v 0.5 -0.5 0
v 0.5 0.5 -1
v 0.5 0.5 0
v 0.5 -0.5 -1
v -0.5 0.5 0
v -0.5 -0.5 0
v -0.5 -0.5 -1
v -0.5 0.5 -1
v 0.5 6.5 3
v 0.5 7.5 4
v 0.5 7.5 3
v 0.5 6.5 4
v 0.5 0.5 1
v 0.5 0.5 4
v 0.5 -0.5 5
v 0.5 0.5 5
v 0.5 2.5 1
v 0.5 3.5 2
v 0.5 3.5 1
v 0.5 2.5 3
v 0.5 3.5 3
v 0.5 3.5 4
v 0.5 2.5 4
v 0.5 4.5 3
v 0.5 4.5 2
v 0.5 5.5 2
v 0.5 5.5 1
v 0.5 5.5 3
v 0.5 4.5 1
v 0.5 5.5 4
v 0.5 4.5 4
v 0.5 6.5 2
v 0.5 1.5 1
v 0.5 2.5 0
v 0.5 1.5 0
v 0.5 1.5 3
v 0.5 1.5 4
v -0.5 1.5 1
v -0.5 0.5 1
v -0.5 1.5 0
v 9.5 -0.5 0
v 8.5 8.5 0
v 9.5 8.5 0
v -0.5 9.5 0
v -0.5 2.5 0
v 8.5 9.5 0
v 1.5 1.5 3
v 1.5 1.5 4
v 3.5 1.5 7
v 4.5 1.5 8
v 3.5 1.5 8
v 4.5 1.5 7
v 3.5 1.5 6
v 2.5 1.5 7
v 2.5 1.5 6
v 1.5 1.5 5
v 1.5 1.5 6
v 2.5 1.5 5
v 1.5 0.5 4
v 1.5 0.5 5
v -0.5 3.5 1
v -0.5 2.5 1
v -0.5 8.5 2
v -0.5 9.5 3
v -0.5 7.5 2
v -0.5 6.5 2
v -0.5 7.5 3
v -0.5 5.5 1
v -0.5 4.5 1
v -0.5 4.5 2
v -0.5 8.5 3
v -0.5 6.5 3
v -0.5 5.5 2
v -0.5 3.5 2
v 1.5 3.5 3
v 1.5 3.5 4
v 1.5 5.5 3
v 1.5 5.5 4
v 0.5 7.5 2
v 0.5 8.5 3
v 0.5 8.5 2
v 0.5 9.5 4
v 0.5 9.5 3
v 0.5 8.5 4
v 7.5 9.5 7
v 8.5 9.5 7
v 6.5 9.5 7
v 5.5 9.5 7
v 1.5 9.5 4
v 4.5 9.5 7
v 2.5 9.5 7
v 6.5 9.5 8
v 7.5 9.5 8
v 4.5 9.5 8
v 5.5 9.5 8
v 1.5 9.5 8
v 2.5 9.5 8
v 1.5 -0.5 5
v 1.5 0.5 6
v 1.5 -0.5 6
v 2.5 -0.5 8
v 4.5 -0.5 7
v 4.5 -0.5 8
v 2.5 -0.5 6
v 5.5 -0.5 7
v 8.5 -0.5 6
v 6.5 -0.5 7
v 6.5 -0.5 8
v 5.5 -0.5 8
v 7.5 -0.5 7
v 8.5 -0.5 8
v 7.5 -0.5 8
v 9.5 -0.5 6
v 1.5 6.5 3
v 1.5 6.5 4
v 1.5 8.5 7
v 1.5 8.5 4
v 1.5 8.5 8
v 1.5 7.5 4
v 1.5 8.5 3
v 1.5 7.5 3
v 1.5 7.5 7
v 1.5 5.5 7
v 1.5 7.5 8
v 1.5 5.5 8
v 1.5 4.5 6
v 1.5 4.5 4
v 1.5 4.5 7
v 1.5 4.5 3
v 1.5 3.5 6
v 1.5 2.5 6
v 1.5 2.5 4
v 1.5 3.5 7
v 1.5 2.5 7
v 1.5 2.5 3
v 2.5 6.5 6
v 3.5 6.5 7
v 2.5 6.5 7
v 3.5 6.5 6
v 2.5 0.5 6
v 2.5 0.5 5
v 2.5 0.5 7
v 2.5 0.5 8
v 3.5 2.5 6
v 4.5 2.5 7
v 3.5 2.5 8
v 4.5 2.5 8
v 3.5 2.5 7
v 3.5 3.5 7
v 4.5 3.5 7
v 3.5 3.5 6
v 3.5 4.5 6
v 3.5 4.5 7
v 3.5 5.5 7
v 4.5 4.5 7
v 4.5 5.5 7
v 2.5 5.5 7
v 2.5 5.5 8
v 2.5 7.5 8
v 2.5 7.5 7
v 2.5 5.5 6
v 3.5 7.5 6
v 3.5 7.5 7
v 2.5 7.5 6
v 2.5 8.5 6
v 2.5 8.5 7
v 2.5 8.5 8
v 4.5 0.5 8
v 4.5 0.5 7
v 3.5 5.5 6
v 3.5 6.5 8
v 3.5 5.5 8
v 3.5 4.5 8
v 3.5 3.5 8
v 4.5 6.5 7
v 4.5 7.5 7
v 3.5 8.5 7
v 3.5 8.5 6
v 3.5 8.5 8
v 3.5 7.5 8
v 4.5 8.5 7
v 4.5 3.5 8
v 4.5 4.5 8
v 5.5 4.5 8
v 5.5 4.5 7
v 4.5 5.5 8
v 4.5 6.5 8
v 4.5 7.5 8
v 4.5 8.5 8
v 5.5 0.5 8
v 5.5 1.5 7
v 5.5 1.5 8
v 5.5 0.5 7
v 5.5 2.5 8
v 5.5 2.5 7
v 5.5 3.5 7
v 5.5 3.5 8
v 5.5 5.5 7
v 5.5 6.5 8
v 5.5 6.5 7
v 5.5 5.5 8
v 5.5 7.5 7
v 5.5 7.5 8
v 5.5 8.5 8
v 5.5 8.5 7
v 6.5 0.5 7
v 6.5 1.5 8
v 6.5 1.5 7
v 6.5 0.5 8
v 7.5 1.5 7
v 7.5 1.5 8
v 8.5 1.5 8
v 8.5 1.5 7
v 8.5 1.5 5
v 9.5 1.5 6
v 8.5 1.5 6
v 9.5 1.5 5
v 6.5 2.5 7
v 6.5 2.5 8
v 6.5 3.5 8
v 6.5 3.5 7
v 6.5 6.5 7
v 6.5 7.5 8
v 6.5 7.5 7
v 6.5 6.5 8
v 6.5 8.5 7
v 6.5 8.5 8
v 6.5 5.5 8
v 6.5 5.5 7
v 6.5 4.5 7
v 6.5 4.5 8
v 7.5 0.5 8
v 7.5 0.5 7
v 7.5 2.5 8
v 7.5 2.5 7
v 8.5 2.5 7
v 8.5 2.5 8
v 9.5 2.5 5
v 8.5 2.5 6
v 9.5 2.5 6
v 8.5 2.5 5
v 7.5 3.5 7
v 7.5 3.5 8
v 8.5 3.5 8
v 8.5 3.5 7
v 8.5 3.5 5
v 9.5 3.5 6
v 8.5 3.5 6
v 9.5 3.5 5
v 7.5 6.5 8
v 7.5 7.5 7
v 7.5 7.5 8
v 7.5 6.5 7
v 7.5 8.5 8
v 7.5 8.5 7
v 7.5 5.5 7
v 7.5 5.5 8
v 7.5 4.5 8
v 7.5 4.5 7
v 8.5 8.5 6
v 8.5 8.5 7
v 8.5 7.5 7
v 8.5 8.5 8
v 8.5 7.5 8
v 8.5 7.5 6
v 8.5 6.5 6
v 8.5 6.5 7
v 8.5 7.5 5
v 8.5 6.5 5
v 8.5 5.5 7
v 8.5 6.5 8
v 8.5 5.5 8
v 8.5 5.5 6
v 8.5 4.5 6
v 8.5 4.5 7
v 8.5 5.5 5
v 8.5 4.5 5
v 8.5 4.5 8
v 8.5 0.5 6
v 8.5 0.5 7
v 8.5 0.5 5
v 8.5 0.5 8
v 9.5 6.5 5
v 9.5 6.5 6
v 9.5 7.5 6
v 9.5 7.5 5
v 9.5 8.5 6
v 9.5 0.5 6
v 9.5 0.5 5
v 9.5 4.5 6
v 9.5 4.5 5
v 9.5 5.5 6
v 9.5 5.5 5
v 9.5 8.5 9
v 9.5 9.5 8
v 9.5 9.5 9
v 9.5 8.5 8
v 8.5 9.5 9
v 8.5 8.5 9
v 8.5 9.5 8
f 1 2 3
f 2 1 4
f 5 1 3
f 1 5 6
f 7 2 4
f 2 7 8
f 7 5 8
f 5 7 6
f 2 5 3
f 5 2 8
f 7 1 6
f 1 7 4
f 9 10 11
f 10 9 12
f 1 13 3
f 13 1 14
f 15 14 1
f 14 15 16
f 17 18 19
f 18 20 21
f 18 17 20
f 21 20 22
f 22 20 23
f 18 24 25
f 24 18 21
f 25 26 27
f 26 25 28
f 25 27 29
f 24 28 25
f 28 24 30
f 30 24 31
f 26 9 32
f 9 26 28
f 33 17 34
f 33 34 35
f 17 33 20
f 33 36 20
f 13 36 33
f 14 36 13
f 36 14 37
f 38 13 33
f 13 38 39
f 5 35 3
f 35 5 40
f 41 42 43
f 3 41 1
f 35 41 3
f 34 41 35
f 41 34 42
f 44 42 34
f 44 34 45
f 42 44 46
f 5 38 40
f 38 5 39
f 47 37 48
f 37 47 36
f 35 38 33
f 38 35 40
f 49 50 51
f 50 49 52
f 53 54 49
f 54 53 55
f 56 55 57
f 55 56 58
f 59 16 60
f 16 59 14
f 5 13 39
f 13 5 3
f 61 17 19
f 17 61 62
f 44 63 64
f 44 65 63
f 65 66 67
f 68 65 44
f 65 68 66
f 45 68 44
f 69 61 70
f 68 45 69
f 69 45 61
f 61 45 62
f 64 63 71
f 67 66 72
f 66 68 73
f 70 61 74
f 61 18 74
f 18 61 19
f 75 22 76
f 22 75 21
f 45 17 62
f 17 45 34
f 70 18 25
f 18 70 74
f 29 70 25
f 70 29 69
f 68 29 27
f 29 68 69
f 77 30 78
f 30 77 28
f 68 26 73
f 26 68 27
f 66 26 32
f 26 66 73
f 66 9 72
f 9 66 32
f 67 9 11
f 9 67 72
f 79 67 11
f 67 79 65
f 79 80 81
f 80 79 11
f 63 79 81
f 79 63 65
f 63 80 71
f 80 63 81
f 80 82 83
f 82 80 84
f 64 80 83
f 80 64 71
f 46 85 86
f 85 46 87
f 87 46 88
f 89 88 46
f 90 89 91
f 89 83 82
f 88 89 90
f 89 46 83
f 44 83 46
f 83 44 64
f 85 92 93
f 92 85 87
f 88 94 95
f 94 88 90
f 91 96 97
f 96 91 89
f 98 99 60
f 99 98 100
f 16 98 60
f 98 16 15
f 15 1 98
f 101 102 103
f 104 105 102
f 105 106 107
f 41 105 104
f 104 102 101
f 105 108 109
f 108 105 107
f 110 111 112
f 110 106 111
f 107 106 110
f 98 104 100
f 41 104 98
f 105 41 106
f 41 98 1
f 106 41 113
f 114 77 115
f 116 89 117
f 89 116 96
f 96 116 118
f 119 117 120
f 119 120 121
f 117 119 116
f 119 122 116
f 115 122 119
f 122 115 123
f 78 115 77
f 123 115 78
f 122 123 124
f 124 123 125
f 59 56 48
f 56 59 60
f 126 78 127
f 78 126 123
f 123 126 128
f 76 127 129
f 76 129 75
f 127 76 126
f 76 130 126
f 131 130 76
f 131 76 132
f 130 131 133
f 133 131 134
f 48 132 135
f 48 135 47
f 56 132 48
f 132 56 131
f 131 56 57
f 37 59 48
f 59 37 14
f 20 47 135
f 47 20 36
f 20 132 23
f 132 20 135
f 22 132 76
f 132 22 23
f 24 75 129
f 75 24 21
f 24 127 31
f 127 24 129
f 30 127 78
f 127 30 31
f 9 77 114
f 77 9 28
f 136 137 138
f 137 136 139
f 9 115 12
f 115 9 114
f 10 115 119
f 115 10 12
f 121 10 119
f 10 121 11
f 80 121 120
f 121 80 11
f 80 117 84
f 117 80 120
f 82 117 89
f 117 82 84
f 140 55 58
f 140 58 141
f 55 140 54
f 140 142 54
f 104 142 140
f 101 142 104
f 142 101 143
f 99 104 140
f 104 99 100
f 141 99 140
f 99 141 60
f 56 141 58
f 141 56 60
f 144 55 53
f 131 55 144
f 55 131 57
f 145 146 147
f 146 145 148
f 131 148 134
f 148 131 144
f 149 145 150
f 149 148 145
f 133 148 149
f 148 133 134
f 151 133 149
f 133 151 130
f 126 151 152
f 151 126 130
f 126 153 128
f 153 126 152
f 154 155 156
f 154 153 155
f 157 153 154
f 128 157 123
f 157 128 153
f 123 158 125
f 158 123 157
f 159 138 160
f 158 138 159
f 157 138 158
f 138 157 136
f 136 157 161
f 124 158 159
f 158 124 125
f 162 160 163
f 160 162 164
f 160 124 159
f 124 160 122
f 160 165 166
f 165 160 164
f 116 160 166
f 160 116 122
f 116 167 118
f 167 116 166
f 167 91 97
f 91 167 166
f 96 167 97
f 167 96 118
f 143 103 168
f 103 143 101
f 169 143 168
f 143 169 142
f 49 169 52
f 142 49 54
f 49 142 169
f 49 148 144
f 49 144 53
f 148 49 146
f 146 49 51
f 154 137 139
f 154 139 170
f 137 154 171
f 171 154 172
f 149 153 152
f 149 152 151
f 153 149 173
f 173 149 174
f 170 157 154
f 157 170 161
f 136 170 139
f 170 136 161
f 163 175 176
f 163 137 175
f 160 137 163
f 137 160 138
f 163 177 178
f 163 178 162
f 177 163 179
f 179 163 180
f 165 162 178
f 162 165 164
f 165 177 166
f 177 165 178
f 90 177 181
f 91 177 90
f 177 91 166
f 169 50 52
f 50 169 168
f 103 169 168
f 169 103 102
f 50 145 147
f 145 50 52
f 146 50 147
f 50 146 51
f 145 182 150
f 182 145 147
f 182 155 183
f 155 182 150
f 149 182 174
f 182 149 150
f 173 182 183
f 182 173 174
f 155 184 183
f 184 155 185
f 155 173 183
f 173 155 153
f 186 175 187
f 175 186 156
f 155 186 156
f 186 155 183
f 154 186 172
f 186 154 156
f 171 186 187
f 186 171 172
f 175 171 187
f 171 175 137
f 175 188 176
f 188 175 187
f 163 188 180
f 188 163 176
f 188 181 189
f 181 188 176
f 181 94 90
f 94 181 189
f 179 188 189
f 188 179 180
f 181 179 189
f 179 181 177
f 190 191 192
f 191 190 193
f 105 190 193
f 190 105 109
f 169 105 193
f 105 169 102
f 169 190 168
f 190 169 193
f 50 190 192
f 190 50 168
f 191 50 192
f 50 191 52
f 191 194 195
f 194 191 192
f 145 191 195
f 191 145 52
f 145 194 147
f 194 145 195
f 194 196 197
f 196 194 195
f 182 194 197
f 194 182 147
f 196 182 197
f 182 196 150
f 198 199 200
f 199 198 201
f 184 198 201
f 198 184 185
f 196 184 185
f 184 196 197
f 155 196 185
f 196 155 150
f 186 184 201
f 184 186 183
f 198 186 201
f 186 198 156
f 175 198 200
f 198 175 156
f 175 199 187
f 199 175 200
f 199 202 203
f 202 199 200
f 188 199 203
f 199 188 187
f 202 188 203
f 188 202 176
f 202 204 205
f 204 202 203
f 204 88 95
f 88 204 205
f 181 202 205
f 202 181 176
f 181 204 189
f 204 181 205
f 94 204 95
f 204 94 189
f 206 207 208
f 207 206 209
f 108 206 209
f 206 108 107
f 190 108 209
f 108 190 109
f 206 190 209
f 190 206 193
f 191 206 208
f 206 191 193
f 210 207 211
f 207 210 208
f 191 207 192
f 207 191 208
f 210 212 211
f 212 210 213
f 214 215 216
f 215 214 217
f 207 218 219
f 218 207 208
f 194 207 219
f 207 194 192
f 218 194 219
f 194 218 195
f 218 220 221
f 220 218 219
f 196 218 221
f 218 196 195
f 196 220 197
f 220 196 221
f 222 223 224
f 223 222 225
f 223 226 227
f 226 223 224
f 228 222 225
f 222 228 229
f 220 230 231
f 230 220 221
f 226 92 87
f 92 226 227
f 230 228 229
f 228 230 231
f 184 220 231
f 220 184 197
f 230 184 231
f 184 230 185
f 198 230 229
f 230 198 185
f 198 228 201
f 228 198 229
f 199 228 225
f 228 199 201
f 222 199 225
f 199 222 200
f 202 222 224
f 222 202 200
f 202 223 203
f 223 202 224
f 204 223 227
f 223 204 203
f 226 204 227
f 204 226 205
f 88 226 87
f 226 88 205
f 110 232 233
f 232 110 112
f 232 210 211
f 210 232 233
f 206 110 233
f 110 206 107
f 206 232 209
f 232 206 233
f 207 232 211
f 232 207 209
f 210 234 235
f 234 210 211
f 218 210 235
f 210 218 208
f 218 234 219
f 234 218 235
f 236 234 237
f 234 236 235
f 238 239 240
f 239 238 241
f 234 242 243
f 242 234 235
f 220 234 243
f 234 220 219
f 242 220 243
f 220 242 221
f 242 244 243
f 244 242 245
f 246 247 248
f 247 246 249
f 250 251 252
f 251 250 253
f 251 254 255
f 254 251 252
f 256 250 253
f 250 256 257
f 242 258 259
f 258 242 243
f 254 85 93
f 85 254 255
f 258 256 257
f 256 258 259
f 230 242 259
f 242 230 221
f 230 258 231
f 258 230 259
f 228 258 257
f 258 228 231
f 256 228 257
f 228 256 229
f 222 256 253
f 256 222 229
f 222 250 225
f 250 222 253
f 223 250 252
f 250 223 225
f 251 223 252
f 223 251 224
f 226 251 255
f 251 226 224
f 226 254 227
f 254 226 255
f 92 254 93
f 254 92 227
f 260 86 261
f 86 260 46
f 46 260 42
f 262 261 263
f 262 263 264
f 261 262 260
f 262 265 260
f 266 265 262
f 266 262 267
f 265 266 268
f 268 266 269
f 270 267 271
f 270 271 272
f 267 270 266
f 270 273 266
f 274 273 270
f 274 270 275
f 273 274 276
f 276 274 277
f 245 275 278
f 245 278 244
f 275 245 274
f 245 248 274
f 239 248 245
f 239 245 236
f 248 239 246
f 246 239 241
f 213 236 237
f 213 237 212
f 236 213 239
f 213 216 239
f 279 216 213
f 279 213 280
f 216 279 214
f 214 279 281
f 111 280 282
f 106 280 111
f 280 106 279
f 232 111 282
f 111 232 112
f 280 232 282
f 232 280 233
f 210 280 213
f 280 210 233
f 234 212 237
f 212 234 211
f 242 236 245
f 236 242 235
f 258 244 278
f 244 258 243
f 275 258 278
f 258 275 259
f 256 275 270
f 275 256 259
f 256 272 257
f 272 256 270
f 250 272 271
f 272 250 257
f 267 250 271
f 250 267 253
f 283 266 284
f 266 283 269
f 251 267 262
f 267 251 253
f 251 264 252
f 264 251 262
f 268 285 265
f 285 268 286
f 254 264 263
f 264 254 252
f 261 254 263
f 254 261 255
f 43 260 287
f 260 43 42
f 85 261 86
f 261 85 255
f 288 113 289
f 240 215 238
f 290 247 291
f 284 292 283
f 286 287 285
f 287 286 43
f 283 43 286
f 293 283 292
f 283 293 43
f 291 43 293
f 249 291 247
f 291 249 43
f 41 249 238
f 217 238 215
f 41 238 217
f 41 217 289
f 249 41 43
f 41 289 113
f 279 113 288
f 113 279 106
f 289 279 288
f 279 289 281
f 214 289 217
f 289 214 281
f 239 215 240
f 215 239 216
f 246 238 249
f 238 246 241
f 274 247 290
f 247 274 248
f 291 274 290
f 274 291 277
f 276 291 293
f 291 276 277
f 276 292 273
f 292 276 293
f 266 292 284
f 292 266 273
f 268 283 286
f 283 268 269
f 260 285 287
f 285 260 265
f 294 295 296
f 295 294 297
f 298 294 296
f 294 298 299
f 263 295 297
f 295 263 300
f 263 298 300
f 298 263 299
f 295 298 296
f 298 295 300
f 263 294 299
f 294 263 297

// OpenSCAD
union() {
    translate([0, 0, -0.5]) color([1, 0, 0]) cube([1, 1, 1], center=true);
    translate([0, 1, 0.5]) cube([1, 1, 1], center=true);
    translate([0, 3, 0.5]) cube([1, 1, 1], center=true);
    translate([0, 4, 1.0]) cube([1, 1, 2], center=true);
    translate([0, 5, 0.5]) cube([1, 1, 1], center=true);
    translate([0, 6, 1.0]) cube([1, 1, 2], center=true);
    translate([0, 7, 1.5]) cube([1, 1, 3], center=true);
    translate([0, 8, 1.0]) cube([1, 1, 2], center=true);
    translate([0, 9, 1.5]) cube([1, 1, 3], center=true);
    translate([1, 0, 2.5]) cube([1, 1, 5], center=true);
    translate([1, 1, 2.0]) cube([1, 1, 4], center=true);
    translate([1, 2, 1.5]) cube([1, 1, 3], center=true);
    translate([1, 3, 2.0]) cube([1, 1, 4], center=true);
    translate([1, 4, 1.5]) cube([1, 1, 3], center=true);
    translate([1, 5, 2.0]) cube([1, 1, 4], center=true);
    translate([1, 6, 1.5]) cube([1, 1, 3], center=true);
    translate([1, 7, 2.0]) cube([1, 1, 4], center=true);
    translate([1, 8, 1.5]) cube([1, 1, 3], center=true);
    translate([1, 9, 2.0]) cube([1, 1, 4], center=true);
    translate([2, 0, 3.0]) cube([1, 1, 6], center=true);
    translate([2, 1, 2.5]) cube([1, 1, 5], center=true);
    translate([2, 2, 3.0]) cube([1, 1, 6], center=true);
    translate([2, 3, 3.5]) cube([1, 1, 7], center=true);
    translate([2, 4, 3.0]) cube([1, 1, 6], center=true);
    translate([2, 5, 3.5]) cube([1, 1, 7], center=true);
    translate([2, 6, 4.0]) cube([1, 1, 8], center=true);
    translate([2, 7, 4.0]) cube([1, 1, 8], center=true);
    translate([2, 8, 3.5]) cube([1, 1, 7], center=true);
    translate([2, 9, 4.0]) cube([1, 1, 8], center=true);
    translate([3, 0, 4.0]) cube([1, 1, 8], center=true);
    translate([3, 1, 3.5]) cube([1, 1, 7], center=true);
    translate([3, 2, 3.0]) cube([1, 1, 6], center=true);
    translate([3, 3, 3.5]) cube([1, 1, 7], center=true);
    translate([3, 4, 3.0]) cube([1, 1, 6], center=true);
    translate([3, 5, 3.5]) cube([1, 1, 7], center=true);
    translate([3, 6, 3.0]) cube([1, 1, 6], center=true);
    translate([3, 7, 3.5]) cube([1, 1, 7], center=true);
    translate([3, 8, 3.0]) cube([1, 1, 6], center=true);
    translate([3, 9, 3.5]) cube([1, 1, 7], center=true);
    translate([4, 0, 4.0]) cube([1, 1, 8], center=true);
    translate([4, 1, 3.5]) cube([1, 1, 7], center=true);
    translate([4, 2, 4.0]) cube([1, 1, 8], center=true);
    translate([4, 3, 3.5]) cube([1, 1, 7], center=true);
    translate([4, 4, 4.0]) cube([1, 1, 8], center=true);
    translate([4, 5, 3.5]) cube([1, 1, 7], center=true);
    translate([4, 6, 4.0]) cube([1, 1, 8], center=true);
    translate([4, 7, 3.5]) cube([1, 1, 7], center=true);
    translate([4, 8, 4.0]) cube([1, 1, 8], center=true);
    translate([4, 9, 3.5]) cube([1, 1, 7], center=true);
    translate([5, 0, 3.5]) cube([1, 1, 7], center=true);
    translate([5, 1, 4.0]) cube([1, 1, 8], center=true);
    translate([5, 2, 3.5]) cube([1, 1, 7], center=true);
    translate([5, 3, 4.0]) cube([1, 1, 8], center=true);
    translate([5, 4, 3.5]) cube([1, 1, 7], center=true);
    translate([5, 5, 4.0]) cube([1, 1, 8], center=true);
    translate([5, 6, 3.5]) cube([1, 1, 7], center=true);
    translate([5, 7, 4.0]) cube([1, 1, 8], center=true);
    translate([5, 8, 3.5]) cube([1, 1, 7], center=true);
    translate([5, 9, 4.0]) cube([1, 1, 8], center=true);
    translate([6, 0, 4.0]) cube([1, 1, 8], center=true);
    translate([6, 1, 3.5]) cube([1, 1, 7], center=true);
    translate([6, 2, 4.0]) cube([1, 1, 8], center=true);
    translate([6, 3, 3.5]) cube([1, 1, 7], center=true);
    translate([6, 4, 4.0]) cube([1, 1, 8], center=true);
    translate([6, 5, 3.5]) cube([1, 1, 7], center=true);
    translate([6, 6, 4.0]) cube([1, 1, 8], center=true);
    translate([6, 7, 3.5]) cube([1, 1, 7], center=true);
    translate([6, 8, 4.0]) cube([1, 1, 8], center=true);
    translate([6, 9, 3.5]) cube([1, 1, 7], center=true);
    translate([7, 0, 3.5]) cube([1, 1, 7], center=true);
    translate([7, 1, 4.0]) cube([1, 1, 8], center=true);
    translate([7, 2, 3.5]) cube([1, 1, 7], center=true);
    translate([7, 3, 4.0]) cube([1, 1, 8], center=true);
    translate([7, 4, 3.5]) cube([1, 1, 7], center=true);
    translate([7, 5, 4.0]) cube([1, 1, 8], center=true);
    translate([7, 6, 3.5]) cube([1, 1, 7], center=true);
    translate([7, 7, 4.0]) cube([1, 1, 8], center=true);
    translate([7, 8, 3.5]) cube([1, 1, 7], center=true);
    translate([7, 9, 4.0]) cube([1, 1, 8], center=true);
    translate([8, 0, 4.0]) cube([1, 1, 8], center=true);
    translate([8, 1, 3.5]) cube([1, 1, 7], center=true);
    translate([8, 2, 4.0]) cube([1, 1, 8], center=true);
    translate([8, 3, 3.5]) cube([1, 1, 7], center=true);
    translate([8, 4, 4.0]) cube([1, 1, 8], center=true);
    translate([8, 5, 3.5]) cube([1, 1, 7], center=true);
    translate([8, 6, 4.0]) cube([1, 1, 8], center=true);
    translate([8, 7, 3.5]) cube([1, 1, 7], center=true);
    translate([8, 8, 4.0]) cube([1, 1, 8], center=true);
    translate([8, 9, 3.5]) cube([1, 1, 7], center=true);
    translate([9, 0, 3.0]) cube([1, 1, 6], center=true);
    translate([9, 1, 2.5]) cube([1, 1, 5], center=true);
    translate([9, 2, 3.0]) cube([1, 1, 6], center=true);
    translate([9, 3, 2.5]) cube([1, 1, 5], center=true);
    translate([9, 4, 3.0]) cube([1, 1, 6], center=true);
    translate([9, 5, 2.5]) cube([1, 1, 5], center=true);
    translate([9, 6, 3.0]) cube([1, 1, 6], center=true);
    translate([9, 7, 2.5]) cube([1, 1, 5], center=true);
    translate([9, 8, 3.0]) cube([1, 1, 6], center=true);
    translate([9, 9, 8.5]) color([0, 0, 1]) cube([1, 1, 1], center=true);
}
